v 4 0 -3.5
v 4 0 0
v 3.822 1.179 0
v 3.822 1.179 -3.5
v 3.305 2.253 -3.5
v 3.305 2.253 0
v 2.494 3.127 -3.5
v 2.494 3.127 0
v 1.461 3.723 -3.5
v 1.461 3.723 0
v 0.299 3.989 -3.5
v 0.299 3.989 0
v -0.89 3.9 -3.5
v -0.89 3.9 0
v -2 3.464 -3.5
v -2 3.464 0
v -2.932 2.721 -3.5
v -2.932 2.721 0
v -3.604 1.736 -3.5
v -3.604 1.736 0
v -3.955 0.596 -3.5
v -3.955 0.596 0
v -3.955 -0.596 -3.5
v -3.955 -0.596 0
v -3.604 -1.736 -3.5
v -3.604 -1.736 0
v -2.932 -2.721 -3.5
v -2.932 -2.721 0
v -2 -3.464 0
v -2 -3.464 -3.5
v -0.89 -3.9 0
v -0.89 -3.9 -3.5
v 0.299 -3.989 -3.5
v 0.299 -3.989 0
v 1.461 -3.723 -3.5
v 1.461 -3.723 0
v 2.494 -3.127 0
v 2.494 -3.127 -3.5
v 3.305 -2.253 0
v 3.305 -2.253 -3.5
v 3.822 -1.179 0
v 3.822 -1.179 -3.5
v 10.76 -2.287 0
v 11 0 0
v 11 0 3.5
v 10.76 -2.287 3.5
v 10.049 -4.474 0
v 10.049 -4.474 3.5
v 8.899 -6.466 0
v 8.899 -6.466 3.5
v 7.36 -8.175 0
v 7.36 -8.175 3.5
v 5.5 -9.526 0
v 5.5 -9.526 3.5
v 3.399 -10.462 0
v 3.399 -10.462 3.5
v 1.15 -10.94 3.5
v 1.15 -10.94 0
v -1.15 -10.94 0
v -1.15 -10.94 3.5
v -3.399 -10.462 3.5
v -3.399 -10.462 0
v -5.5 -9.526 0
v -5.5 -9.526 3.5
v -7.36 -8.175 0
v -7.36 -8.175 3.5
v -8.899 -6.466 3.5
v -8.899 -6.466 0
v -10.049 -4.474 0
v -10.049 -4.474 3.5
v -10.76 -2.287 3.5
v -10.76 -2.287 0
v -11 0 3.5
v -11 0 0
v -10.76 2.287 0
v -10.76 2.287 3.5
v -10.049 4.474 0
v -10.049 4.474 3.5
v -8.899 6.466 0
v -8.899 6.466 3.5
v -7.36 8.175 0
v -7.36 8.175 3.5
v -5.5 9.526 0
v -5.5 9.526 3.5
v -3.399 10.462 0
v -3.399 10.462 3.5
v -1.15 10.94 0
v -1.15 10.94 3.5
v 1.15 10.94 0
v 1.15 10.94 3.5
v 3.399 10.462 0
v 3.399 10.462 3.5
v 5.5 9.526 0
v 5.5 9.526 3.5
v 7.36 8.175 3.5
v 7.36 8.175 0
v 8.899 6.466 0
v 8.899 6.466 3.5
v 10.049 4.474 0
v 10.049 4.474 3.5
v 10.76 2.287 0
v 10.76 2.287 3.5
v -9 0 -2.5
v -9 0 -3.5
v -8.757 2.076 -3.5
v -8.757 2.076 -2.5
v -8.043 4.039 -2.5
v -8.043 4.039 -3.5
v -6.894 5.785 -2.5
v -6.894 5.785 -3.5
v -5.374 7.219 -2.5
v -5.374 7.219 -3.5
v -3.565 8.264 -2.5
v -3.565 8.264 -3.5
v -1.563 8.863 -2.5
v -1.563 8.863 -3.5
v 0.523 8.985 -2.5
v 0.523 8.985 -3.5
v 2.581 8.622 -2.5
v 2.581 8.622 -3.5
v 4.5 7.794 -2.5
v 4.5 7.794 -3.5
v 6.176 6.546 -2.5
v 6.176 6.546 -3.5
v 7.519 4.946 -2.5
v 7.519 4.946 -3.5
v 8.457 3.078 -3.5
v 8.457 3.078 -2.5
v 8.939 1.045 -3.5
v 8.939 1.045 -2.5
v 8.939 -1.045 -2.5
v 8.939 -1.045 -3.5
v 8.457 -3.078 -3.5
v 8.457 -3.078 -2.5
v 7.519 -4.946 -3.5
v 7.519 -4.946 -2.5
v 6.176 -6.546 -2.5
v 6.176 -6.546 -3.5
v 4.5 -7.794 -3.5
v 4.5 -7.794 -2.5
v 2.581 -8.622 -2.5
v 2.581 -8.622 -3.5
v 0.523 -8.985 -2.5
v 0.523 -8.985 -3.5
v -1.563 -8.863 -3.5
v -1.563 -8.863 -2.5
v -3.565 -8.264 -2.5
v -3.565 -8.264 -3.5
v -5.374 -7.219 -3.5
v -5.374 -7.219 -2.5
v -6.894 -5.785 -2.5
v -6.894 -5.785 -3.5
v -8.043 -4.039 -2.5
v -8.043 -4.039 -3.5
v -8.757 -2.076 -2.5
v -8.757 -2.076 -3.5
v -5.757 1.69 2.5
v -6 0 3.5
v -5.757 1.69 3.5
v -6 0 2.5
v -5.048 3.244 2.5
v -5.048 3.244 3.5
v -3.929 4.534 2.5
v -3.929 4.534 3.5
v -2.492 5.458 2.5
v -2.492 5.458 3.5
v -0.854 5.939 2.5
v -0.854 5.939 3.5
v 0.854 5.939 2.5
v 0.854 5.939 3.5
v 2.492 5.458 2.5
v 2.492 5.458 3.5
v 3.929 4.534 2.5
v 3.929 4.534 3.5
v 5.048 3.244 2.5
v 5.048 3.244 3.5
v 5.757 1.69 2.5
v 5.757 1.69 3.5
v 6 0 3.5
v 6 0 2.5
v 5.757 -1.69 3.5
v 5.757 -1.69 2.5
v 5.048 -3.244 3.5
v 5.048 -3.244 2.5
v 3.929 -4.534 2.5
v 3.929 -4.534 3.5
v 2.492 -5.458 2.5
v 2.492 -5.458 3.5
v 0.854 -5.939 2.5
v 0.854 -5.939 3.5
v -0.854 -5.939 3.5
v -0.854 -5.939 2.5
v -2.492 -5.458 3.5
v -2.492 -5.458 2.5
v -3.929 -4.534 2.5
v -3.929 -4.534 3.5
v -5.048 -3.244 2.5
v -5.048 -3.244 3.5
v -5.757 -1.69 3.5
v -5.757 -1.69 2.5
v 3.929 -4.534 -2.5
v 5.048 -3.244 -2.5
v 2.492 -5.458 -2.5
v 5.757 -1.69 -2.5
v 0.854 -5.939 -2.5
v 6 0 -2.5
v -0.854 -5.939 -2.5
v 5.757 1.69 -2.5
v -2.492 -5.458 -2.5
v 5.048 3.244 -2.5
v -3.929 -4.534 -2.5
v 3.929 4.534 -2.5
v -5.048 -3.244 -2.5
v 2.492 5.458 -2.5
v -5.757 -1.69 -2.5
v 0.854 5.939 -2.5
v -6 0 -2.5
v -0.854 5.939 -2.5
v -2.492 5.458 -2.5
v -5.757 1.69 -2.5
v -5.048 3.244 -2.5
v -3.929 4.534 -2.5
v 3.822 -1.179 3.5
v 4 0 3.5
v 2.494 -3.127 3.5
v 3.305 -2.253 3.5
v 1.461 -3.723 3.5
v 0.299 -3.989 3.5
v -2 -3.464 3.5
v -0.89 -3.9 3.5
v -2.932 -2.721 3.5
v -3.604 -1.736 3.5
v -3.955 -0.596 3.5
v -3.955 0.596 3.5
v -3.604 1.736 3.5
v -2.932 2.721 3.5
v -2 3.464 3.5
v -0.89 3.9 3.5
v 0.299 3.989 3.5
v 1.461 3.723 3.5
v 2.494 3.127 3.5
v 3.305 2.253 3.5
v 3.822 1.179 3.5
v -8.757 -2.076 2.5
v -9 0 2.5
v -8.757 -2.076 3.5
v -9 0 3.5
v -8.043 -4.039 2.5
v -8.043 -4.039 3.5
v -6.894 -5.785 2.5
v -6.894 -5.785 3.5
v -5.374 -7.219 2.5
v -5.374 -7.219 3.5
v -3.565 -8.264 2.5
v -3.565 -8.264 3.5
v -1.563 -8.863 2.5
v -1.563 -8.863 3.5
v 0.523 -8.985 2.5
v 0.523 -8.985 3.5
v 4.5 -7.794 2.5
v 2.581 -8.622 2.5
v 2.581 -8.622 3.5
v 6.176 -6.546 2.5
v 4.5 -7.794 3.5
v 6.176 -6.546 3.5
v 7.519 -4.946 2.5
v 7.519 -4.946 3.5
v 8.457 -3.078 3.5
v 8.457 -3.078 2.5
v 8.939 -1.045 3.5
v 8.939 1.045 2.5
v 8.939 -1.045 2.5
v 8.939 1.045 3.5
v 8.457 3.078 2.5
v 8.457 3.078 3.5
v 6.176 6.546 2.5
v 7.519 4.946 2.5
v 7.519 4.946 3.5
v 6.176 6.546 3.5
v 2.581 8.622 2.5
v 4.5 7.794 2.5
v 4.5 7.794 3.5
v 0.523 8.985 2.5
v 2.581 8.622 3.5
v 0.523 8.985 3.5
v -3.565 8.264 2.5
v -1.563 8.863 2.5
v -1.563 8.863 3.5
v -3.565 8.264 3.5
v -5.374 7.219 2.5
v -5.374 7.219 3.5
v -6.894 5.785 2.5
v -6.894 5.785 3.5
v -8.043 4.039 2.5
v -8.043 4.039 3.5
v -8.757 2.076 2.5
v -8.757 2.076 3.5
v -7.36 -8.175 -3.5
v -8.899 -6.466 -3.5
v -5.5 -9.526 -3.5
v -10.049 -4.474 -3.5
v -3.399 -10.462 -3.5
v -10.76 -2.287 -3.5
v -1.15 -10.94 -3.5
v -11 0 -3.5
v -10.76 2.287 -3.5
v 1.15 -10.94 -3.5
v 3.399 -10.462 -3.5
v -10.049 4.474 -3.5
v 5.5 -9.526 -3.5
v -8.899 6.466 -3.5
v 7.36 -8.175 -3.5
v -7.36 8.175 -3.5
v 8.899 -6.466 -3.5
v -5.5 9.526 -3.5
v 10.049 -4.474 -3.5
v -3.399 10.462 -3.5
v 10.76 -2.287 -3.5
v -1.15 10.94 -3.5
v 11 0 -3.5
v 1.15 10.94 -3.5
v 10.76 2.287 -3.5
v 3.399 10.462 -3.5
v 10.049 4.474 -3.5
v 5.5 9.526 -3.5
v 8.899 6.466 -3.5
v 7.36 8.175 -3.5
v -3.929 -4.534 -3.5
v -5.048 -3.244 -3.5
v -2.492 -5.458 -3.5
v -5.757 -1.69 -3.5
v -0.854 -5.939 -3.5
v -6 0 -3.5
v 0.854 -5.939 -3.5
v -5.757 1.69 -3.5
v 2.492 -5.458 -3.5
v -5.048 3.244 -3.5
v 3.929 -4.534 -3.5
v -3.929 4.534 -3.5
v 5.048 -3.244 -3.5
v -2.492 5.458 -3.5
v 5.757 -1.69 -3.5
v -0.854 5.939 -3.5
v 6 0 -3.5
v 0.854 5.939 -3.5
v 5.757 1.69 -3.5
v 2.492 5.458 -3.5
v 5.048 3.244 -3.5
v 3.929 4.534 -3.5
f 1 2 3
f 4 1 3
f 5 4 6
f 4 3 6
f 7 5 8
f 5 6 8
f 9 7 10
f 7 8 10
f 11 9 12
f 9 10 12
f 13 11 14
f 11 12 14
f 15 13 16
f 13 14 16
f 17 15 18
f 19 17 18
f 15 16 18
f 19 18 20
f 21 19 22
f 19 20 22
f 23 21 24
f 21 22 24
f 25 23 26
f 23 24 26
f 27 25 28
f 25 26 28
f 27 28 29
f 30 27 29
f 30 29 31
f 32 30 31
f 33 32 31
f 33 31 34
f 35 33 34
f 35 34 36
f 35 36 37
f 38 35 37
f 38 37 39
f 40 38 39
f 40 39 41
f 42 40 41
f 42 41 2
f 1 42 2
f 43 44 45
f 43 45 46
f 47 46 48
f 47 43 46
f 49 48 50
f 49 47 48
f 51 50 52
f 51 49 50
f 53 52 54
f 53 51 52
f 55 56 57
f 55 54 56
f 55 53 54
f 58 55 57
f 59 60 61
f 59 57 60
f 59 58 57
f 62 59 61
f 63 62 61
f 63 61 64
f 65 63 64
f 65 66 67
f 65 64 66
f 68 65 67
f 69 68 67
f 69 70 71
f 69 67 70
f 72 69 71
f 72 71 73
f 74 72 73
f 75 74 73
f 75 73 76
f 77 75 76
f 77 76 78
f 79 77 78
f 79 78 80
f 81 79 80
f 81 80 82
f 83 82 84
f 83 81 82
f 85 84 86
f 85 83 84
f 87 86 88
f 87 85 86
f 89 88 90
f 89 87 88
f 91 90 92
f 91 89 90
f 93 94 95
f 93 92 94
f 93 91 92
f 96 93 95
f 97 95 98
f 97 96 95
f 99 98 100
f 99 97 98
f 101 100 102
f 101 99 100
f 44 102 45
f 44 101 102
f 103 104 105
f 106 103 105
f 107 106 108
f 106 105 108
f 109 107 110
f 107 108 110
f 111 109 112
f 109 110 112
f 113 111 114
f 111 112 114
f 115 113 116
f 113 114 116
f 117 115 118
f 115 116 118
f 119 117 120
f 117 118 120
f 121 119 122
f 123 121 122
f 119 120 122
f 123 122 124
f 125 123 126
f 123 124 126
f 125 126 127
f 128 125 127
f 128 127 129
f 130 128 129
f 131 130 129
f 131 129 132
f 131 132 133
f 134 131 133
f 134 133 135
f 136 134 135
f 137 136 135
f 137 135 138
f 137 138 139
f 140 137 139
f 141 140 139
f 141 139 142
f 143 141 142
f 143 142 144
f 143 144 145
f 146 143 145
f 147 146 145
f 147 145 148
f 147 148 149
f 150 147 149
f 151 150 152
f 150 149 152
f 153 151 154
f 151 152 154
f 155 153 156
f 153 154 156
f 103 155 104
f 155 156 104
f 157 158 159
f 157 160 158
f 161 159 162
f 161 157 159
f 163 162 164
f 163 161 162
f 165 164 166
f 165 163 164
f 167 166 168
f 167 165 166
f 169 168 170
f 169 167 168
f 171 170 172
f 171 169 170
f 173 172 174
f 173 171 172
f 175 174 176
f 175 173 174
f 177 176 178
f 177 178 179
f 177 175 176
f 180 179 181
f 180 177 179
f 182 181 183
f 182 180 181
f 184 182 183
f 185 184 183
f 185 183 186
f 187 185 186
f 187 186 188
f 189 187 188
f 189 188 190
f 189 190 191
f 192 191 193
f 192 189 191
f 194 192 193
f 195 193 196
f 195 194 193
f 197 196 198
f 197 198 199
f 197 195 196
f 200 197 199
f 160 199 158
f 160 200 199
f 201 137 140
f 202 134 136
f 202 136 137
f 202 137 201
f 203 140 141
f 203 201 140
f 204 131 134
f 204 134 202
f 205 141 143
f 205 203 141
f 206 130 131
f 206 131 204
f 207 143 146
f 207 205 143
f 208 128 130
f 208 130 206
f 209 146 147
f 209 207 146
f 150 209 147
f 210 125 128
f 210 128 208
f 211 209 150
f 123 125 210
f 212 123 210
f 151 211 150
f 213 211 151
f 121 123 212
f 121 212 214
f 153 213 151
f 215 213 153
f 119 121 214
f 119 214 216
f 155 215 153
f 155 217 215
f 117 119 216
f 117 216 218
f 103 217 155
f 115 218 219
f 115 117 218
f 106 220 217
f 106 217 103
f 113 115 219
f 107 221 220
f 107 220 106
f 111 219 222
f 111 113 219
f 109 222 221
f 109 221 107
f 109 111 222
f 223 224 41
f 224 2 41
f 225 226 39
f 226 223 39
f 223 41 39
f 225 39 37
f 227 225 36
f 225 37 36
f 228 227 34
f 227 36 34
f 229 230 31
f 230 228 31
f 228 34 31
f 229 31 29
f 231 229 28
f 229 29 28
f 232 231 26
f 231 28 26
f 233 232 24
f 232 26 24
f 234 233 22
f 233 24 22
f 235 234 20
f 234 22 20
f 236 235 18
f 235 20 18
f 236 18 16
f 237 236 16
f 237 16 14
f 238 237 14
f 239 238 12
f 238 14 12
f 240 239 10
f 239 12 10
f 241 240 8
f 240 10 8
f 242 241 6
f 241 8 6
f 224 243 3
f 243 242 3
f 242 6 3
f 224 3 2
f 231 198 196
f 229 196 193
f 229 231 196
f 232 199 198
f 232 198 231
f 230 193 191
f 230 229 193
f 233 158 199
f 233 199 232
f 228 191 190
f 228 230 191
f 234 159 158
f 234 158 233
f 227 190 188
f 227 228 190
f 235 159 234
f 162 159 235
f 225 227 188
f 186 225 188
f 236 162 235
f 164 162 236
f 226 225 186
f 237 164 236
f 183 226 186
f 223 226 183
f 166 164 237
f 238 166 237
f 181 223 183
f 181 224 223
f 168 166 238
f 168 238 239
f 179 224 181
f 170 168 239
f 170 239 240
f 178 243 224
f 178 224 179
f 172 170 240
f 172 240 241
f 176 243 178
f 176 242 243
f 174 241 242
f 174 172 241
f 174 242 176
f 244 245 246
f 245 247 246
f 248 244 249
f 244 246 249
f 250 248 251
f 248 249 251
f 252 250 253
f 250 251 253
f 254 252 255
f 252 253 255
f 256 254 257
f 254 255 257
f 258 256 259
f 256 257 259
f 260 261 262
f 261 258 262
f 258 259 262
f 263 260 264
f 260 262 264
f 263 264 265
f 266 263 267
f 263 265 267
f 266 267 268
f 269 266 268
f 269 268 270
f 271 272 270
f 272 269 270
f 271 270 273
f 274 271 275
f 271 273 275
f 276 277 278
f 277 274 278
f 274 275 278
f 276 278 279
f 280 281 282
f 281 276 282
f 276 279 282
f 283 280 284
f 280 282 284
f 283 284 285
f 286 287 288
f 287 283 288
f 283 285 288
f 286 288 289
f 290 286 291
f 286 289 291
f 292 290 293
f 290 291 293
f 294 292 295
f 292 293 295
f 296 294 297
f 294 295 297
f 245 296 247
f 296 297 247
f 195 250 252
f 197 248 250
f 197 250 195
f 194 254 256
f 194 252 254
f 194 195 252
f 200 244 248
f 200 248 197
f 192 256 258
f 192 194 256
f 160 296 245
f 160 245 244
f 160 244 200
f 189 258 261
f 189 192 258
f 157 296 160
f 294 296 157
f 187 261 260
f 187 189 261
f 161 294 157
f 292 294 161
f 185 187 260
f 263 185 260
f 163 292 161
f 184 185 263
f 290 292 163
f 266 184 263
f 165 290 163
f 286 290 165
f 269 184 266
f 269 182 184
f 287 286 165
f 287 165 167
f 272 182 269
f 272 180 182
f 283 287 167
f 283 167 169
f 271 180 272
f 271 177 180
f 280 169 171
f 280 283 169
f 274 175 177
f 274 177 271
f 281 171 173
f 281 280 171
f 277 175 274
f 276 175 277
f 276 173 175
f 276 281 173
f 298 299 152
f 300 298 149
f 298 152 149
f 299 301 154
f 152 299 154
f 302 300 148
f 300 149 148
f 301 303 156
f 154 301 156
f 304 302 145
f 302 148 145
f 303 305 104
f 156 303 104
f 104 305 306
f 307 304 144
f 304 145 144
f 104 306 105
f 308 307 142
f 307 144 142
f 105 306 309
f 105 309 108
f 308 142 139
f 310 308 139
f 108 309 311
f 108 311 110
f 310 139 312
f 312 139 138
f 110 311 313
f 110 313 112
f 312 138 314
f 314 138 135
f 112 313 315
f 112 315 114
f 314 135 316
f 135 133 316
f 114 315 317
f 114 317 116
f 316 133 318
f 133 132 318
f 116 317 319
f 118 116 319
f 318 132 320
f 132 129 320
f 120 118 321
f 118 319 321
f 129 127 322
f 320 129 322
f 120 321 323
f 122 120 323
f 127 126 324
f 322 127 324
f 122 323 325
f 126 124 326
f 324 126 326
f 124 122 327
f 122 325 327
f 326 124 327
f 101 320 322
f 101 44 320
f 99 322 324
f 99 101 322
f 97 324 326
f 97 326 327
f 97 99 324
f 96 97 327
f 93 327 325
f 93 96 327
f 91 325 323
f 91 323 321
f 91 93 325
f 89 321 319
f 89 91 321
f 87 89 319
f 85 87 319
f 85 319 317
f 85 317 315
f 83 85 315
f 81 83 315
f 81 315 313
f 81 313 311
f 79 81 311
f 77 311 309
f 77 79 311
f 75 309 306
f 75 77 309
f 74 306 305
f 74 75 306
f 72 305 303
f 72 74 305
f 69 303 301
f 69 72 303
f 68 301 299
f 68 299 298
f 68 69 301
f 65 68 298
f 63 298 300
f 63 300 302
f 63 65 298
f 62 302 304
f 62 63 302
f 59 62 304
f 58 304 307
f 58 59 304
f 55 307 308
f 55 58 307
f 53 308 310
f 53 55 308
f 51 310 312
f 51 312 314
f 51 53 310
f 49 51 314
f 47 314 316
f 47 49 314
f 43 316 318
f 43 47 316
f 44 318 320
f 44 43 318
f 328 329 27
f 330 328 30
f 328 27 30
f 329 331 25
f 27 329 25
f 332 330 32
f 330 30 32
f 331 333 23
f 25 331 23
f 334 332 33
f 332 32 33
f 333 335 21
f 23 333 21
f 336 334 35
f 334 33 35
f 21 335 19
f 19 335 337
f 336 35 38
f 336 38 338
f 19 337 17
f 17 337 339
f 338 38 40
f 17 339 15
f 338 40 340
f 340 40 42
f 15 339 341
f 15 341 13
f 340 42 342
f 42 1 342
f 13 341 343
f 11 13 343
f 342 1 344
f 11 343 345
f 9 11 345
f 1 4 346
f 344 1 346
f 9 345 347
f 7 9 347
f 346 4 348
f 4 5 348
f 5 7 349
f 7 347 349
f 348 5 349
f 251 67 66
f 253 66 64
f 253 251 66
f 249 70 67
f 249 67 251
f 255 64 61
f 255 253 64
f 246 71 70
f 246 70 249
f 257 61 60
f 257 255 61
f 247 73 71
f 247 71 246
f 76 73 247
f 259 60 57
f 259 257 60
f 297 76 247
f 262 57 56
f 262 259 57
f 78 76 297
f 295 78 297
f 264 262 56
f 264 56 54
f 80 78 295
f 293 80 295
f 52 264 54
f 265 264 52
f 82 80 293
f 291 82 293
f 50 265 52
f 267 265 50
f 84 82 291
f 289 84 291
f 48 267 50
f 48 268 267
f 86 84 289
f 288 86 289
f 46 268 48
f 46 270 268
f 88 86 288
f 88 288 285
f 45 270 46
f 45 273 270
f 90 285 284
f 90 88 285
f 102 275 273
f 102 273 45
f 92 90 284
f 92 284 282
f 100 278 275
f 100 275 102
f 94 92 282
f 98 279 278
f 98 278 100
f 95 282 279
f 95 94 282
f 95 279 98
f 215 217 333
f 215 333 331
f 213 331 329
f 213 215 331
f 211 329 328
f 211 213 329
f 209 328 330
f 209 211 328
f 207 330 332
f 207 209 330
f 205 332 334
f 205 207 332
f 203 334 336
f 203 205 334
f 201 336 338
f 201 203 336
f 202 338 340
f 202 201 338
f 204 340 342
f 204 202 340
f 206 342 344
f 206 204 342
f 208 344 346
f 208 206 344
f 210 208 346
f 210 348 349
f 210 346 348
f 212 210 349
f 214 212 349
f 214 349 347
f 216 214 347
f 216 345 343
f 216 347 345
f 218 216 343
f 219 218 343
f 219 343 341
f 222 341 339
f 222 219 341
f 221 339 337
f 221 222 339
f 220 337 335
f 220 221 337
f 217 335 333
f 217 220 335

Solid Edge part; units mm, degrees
sketch "Sketch1" plane through (0, 0, 0) normal (0, 0, 1) x (1, 0, 0)
  circle A0 centre (0, 0) radius 11
  circle A1 centre (0, 0) radius 4
  dimension "D1" = 8
  dimension "D2" = 22
extrude "Protrusion1" add sketch "Sketch1" along normal mid plane 7
sketch "Sketch2" plane through (0, 0, 0) normal (0, -1, 0) x (1, 0, 0)
  line L0 (-6, -3.5) -> (-6, -2.5)
  line L1 (-6, -2.5) -> (-9, -2.5)
  line L2 (-9, -2.5) -> (-9, -3.5)
  dimension "D1" = 1
revolve "RevolvedCutout1" cut sketch "Sketch2" angle 360 about axis through (0, 0, 54) along (0, 0, -1) material side at (-6.05, 0, -3)
mirror "Mirror1" about plane through (0, 0, 0) normal (0, 0, 1) of "RevolvedCutout1"
properties material "Stainless steel"
